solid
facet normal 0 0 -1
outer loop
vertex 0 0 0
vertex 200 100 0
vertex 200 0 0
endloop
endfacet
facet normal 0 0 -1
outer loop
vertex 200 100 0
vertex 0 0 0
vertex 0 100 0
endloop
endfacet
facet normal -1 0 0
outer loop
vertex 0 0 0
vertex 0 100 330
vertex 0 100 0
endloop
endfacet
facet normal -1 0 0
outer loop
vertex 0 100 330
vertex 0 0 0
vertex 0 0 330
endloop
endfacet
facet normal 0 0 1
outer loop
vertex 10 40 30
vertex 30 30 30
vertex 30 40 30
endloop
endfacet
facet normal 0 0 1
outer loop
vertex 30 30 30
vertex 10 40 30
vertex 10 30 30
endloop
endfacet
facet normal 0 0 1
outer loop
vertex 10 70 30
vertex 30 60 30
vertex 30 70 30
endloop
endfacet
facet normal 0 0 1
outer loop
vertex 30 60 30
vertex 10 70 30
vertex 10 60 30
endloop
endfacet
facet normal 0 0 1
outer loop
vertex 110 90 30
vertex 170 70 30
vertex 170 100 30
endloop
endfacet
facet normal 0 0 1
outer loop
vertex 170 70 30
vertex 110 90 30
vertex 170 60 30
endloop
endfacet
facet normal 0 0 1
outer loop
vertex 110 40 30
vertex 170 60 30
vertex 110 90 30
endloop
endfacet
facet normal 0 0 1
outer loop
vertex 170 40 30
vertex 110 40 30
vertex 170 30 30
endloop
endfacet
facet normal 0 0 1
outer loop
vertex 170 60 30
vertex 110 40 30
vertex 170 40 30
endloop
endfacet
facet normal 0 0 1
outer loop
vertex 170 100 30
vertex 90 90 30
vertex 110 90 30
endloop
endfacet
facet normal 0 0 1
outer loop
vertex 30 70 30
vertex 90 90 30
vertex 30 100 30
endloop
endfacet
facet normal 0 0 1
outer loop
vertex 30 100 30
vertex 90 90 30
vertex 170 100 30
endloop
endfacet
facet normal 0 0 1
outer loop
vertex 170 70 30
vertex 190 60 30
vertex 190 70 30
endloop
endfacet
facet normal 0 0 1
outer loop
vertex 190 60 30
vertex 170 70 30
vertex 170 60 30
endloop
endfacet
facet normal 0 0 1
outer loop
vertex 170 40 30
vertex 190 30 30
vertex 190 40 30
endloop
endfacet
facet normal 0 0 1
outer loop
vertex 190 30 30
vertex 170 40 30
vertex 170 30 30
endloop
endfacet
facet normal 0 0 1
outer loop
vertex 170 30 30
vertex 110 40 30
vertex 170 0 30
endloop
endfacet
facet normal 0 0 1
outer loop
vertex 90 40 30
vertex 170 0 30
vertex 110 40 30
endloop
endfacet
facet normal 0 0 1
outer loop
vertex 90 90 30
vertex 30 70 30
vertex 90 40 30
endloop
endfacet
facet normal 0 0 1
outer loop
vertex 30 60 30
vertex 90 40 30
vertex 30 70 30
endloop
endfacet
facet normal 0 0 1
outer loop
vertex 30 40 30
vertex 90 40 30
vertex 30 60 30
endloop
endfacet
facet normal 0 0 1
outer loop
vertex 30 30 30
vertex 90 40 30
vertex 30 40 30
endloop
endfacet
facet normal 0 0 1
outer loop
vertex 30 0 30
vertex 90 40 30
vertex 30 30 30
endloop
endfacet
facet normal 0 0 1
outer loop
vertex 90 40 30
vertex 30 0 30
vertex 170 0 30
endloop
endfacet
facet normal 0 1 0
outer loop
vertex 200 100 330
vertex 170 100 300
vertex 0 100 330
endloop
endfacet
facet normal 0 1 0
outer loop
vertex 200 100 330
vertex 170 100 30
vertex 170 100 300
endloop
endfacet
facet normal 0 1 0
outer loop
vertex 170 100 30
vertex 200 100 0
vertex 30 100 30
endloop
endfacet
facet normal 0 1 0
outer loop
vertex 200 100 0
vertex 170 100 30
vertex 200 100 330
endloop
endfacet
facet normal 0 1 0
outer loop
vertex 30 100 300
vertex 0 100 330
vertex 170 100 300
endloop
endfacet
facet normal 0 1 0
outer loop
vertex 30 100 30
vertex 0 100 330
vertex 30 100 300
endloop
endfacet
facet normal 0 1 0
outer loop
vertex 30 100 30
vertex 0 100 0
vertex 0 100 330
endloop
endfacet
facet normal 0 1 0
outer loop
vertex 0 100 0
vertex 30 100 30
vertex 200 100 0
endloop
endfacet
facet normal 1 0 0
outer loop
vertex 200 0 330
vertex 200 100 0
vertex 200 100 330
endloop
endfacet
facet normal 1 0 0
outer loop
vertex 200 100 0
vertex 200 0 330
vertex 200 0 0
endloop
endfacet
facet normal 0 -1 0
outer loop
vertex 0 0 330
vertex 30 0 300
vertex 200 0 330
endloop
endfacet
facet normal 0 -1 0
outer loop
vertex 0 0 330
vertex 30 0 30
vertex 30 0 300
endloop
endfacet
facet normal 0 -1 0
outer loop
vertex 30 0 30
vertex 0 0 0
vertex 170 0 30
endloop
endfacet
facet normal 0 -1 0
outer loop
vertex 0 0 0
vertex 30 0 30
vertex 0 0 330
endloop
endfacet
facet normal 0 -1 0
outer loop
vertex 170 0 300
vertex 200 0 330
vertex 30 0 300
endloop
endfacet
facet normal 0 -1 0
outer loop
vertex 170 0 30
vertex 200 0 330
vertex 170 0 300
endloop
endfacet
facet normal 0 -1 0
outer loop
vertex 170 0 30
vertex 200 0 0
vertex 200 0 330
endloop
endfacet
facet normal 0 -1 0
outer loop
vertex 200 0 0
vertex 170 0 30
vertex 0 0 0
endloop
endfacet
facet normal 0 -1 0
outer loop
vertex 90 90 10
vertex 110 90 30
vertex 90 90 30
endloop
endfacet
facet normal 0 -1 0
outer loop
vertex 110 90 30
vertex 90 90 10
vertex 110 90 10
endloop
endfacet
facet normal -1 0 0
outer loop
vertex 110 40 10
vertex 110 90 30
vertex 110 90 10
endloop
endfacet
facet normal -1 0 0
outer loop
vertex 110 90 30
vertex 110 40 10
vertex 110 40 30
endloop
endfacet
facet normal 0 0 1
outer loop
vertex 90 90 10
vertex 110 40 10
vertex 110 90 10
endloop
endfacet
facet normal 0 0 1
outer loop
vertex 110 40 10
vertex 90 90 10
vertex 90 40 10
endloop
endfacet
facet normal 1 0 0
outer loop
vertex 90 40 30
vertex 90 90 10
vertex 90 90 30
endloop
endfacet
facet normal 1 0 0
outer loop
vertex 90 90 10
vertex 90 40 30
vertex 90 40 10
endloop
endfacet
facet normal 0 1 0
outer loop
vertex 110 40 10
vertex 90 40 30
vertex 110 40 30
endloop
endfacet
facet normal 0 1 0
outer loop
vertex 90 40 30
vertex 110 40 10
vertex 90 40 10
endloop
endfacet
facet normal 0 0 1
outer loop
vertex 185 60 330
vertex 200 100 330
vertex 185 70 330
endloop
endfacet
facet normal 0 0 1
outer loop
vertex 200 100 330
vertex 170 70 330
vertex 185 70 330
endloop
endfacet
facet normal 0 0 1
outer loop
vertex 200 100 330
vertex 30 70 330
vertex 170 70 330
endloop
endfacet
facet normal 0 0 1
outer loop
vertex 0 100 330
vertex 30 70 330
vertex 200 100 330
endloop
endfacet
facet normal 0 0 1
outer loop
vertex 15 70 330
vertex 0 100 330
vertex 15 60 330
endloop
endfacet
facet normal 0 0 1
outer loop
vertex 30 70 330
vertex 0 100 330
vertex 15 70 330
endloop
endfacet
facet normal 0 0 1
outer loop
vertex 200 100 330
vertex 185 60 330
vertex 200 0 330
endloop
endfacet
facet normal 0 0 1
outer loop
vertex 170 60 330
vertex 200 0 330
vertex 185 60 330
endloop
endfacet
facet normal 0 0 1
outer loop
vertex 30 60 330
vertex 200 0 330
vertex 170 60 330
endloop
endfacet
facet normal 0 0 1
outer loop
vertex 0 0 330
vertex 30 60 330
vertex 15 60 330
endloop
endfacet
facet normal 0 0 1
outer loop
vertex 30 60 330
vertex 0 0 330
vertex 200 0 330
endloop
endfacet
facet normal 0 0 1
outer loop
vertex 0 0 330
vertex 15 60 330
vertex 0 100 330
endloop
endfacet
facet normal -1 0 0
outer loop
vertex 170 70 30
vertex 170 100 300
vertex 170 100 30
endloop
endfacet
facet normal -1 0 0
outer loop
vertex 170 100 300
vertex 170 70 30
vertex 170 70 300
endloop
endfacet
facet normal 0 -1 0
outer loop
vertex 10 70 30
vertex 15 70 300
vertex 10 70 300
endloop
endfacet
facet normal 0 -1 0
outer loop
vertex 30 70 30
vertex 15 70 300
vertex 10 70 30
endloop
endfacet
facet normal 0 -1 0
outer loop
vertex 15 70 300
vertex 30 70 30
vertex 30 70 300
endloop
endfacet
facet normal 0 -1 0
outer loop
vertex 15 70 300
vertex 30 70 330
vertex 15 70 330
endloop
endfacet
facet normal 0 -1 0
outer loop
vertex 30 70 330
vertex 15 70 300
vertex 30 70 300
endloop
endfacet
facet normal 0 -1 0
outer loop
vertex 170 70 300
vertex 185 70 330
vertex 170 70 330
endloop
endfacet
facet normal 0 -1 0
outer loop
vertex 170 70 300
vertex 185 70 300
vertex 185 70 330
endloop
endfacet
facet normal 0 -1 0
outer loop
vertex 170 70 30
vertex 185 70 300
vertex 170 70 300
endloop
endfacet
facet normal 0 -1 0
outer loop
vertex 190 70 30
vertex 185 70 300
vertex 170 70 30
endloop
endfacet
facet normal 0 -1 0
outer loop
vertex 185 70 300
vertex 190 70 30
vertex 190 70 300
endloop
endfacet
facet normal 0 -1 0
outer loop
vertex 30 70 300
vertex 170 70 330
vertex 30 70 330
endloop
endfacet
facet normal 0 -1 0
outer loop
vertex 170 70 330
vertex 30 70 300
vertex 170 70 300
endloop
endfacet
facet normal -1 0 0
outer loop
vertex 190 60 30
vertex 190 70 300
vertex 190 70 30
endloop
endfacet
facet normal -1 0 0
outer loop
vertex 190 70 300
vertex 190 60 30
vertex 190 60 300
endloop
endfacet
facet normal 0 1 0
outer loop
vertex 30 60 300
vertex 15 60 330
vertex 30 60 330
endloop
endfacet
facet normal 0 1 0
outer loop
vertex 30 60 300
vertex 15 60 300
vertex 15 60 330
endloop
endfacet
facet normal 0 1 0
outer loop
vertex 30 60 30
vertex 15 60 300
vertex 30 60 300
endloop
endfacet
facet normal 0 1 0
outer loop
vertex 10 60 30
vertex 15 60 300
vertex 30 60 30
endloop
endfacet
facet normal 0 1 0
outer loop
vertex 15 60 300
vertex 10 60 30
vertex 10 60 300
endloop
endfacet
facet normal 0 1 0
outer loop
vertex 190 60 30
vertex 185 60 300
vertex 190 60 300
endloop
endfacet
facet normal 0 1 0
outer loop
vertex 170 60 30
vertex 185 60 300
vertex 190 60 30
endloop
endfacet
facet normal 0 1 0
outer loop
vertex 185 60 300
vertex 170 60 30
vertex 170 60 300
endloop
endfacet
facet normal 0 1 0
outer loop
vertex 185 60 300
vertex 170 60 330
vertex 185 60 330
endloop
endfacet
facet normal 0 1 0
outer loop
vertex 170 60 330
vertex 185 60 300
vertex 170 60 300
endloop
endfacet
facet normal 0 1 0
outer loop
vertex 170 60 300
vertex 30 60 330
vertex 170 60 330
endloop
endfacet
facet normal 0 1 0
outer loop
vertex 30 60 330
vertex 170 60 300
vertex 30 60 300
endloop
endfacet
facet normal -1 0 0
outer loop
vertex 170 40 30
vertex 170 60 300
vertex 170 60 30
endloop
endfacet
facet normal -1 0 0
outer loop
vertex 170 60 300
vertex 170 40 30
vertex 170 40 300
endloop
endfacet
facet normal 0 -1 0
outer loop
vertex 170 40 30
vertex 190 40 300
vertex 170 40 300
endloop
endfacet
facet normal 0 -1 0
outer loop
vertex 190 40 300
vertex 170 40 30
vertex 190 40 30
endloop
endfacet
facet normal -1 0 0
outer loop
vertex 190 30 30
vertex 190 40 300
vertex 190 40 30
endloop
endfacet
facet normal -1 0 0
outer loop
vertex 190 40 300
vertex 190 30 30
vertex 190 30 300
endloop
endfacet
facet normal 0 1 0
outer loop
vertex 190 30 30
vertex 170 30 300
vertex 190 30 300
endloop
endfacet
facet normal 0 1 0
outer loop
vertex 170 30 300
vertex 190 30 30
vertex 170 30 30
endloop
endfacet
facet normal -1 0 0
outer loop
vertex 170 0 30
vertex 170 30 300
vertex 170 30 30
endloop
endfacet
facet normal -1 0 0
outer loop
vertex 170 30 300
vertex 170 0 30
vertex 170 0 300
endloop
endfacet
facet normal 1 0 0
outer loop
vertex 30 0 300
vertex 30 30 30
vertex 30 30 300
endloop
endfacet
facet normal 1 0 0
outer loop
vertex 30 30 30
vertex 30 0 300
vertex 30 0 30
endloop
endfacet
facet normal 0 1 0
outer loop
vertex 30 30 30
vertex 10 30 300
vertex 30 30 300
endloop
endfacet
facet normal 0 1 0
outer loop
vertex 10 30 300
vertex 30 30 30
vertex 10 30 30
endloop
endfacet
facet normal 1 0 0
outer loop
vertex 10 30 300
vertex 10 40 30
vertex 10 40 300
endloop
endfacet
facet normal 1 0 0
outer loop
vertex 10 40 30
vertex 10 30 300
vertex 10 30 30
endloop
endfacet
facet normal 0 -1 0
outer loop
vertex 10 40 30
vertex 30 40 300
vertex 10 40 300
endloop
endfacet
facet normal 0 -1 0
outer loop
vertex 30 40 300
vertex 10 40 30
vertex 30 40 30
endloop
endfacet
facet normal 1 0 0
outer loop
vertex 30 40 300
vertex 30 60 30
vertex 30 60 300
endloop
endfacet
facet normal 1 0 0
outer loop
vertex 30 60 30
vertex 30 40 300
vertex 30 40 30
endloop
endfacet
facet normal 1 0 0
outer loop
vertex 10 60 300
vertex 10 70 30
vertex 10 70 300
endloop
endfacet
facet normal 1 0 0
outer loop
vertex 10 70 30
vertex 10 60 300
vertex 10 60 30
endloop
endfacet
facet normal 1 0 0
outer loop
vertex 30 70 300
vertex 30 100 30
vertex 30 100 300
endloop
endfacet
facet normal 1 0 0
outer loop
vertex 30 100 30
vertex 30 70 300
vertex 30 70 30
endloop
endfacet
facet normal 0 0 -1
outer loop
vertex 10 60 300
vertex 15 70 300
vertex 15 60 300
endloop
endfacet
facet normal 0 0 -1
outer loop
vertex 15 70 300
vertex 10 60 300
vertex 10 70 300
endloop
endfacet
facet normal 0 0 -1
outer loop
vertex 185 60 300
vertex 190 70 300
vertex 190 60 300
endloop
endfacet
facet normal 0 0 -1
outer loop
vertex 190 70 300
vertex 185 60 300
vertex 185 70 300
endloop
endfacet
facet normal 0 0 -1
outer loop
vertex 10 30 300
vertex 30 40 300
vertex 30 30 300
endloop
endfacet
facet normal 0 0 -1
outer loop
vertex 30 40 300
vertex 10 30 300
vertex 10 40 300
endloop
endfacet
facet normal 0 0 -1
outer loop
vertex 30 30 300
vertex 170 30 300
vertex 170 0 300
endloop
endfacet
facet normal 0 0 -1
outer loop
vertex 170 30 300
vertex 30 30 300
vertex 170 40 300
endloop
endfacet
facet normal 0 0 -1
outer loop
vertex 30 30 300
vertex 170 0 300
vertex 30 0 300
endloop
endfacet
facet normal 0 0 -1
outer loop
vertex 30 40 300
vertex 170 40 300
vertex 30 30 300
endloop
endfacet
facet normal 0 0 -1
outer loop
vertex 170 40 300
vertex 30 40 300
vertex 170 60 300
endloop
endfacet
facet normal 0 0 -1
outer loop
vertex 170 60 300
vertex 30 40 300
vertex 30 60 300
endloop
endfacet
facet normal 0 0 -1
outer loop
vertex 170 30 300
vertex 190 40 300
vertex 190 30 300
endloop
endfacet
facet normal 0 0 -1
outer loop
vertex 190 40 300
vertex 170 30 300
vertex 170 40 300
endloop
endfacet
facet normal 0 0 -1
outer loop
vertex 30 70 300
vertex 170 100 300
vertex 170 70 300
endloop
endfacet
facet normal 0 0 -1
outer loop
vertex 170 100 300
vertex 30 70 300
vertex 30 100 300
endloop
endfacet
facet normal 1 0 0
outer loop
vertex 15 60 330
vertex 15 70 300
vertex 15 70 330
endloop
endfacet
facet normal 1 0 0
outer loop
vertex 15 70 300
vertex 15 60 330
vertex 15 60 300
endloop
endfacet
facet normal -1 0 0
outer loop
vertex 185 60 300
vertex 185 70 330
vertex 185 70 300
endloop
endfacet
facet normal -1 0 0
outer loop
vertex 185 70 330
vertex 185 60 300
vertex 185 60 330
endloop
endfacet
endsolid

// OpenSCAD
echo(version=version());
module sensor(){
    linear_extrude(height = 25)
        square([20, 50]);
    
}
module engine(){
        linear_extrude(height = 40)
            square([30, 50]);
        translate([30,25,20]){
        rotate([90,0,90])
        color("purple")
        
            cylinder(  20,   5, 5,false);
        }
    
}
module guide(){
    linear_extrude(height = 300)
            difference(){
        square([30, 100]);
        translate([0,30])
            square([20,10]);
        translate([0,60])
            square([20,10]);
    }
}

module baseSide(){
 difference(){
        linear_extrude(height = 30)
            square([200, 100]);
        translate([110,40,31])
             rotate([0,180,0])
           linear_extrude(height = 21)
        square([20, 50]);
    }
}   
module basePlusGuide(){
baseSide();
    translate([170,0,30])
guide();
    translate([30,100,30])
    rotate([0,0,180])
guide();
    
}
module topSide(){
    difference(){
        linear_extrude(height = 30)
            square([200, 100]);
        translate([15,60,-1])
            linear_extrude(height = 32)
                square([170, 10]);
    }
}
module total(){
    basePlusGuide();
    translate([0,0,300])   
        topSide();
}
total();
